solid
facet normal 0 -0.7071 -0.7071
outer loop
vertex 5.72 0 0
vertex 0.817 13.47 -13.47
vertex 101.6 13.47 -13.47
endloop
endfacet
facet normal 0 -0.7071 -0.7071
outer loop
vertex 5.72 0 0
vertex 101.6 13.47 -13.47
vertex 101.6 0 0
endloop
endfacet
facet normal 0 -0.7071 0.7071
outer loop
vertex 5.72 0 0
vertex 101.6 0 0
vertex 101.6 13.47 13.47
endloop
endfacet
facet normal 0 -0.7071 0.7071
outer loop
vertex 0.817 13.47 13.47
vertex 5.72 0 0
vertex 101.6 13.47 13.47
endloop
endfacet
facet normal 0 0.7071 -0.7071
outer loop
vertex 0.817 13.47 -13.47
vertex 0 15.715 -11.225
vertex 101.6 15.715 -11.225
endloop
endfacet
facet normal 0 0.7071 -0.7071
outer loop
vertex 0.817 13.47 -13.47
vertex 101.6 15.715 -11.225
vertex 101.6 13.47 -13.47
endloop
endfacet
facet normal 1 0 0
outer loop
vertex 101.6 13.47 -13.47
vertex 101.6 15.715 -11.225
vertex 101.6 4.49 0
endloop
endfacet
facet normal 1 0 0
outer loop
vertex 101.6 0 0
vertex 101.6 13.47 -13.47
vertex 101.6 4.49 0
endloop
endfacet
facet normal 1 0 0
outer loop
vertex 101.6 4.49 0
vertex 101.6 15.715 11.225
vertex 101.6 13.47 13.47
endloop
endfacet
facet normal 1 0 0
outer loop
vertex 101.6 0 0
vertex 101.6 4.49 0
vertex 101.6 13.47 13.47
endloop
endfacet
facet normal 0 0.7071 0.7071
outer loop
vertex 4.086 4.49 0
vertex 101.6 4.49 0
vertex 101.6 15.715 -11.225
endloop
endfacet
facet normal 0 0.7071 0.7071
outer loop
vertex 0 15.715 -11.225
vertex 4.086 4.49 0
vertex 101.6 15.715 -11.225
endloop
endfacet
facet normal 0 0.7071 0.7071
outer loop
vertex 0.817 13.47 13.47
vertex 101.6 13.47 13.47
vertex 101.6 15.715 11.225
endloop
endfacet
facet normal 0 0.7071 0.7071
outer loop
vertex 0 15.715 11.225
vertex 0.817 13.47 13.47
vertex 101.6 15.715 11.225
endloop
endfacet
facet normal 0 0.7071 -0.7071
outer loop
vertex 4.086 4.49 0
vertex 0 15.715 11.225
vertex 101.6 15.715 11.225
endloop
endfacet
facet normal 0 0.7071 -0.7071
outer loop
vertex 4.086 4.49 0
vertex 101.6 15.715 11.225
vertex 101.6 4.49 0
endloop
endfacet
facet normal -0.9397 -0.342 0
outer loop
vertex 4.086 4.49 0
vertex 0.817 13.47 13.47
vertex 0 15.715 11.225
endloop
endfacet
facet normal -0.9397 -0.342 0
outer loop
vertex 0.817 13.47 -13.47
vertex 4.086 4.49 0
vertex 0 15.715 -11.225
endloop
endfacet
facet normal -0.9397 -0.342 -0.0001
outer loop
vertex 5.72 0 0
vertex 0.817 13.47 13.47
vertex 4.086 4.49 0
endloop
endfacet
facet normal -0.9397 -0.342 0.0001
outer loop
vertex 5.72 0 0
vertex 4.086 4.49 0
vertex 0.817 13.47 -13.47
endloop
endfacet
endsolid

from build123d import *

# Parameters (mm, degrees)
BOSS_EXTRUDE1_DEPTH = 101.6
SKETCH2_W           = 26.940768364
SKETCH2_H           = 16.724030672
CUT_EXTRUDE1_DEPTH  = 99.46706905


with BuildPart() as part:
    # Sketch1 → Boss-Extrude1 (new body)
    with BuildSketch(Plane(origin=(0, 0, 0), x_dir=(0, 0, -1), z_dir=(1, 0, 0))):
        Polygon((0, 0), (-13.470384182, 13.470384182), (-11.225320151, 15.715448212), (0, 4.490128061), (11.225320151, 15.715448212), (13.470384182, 13.470384182), align=None)
    extrude(amount=BOSS_EXTRUDE1_DEPTH)

    # Sketch2 → Cut-Extrude1 (cut, through all)
    with BuildSketch(Plane(origin=(5.050847696, 1.838358219, 0), x_dir=(0, 0, -1), z_dir=(-0.9396926207859081, -0.34202014332566943, 0))):
        with Locations((0, -6.405675381)):
            Rectangle(SKETCH2_W, SKETCH2_H)
    extrude(amount=CUT_EXTRUDE1_DEPTH, mode=Mode.SUBTRACT)


solid = part.part
